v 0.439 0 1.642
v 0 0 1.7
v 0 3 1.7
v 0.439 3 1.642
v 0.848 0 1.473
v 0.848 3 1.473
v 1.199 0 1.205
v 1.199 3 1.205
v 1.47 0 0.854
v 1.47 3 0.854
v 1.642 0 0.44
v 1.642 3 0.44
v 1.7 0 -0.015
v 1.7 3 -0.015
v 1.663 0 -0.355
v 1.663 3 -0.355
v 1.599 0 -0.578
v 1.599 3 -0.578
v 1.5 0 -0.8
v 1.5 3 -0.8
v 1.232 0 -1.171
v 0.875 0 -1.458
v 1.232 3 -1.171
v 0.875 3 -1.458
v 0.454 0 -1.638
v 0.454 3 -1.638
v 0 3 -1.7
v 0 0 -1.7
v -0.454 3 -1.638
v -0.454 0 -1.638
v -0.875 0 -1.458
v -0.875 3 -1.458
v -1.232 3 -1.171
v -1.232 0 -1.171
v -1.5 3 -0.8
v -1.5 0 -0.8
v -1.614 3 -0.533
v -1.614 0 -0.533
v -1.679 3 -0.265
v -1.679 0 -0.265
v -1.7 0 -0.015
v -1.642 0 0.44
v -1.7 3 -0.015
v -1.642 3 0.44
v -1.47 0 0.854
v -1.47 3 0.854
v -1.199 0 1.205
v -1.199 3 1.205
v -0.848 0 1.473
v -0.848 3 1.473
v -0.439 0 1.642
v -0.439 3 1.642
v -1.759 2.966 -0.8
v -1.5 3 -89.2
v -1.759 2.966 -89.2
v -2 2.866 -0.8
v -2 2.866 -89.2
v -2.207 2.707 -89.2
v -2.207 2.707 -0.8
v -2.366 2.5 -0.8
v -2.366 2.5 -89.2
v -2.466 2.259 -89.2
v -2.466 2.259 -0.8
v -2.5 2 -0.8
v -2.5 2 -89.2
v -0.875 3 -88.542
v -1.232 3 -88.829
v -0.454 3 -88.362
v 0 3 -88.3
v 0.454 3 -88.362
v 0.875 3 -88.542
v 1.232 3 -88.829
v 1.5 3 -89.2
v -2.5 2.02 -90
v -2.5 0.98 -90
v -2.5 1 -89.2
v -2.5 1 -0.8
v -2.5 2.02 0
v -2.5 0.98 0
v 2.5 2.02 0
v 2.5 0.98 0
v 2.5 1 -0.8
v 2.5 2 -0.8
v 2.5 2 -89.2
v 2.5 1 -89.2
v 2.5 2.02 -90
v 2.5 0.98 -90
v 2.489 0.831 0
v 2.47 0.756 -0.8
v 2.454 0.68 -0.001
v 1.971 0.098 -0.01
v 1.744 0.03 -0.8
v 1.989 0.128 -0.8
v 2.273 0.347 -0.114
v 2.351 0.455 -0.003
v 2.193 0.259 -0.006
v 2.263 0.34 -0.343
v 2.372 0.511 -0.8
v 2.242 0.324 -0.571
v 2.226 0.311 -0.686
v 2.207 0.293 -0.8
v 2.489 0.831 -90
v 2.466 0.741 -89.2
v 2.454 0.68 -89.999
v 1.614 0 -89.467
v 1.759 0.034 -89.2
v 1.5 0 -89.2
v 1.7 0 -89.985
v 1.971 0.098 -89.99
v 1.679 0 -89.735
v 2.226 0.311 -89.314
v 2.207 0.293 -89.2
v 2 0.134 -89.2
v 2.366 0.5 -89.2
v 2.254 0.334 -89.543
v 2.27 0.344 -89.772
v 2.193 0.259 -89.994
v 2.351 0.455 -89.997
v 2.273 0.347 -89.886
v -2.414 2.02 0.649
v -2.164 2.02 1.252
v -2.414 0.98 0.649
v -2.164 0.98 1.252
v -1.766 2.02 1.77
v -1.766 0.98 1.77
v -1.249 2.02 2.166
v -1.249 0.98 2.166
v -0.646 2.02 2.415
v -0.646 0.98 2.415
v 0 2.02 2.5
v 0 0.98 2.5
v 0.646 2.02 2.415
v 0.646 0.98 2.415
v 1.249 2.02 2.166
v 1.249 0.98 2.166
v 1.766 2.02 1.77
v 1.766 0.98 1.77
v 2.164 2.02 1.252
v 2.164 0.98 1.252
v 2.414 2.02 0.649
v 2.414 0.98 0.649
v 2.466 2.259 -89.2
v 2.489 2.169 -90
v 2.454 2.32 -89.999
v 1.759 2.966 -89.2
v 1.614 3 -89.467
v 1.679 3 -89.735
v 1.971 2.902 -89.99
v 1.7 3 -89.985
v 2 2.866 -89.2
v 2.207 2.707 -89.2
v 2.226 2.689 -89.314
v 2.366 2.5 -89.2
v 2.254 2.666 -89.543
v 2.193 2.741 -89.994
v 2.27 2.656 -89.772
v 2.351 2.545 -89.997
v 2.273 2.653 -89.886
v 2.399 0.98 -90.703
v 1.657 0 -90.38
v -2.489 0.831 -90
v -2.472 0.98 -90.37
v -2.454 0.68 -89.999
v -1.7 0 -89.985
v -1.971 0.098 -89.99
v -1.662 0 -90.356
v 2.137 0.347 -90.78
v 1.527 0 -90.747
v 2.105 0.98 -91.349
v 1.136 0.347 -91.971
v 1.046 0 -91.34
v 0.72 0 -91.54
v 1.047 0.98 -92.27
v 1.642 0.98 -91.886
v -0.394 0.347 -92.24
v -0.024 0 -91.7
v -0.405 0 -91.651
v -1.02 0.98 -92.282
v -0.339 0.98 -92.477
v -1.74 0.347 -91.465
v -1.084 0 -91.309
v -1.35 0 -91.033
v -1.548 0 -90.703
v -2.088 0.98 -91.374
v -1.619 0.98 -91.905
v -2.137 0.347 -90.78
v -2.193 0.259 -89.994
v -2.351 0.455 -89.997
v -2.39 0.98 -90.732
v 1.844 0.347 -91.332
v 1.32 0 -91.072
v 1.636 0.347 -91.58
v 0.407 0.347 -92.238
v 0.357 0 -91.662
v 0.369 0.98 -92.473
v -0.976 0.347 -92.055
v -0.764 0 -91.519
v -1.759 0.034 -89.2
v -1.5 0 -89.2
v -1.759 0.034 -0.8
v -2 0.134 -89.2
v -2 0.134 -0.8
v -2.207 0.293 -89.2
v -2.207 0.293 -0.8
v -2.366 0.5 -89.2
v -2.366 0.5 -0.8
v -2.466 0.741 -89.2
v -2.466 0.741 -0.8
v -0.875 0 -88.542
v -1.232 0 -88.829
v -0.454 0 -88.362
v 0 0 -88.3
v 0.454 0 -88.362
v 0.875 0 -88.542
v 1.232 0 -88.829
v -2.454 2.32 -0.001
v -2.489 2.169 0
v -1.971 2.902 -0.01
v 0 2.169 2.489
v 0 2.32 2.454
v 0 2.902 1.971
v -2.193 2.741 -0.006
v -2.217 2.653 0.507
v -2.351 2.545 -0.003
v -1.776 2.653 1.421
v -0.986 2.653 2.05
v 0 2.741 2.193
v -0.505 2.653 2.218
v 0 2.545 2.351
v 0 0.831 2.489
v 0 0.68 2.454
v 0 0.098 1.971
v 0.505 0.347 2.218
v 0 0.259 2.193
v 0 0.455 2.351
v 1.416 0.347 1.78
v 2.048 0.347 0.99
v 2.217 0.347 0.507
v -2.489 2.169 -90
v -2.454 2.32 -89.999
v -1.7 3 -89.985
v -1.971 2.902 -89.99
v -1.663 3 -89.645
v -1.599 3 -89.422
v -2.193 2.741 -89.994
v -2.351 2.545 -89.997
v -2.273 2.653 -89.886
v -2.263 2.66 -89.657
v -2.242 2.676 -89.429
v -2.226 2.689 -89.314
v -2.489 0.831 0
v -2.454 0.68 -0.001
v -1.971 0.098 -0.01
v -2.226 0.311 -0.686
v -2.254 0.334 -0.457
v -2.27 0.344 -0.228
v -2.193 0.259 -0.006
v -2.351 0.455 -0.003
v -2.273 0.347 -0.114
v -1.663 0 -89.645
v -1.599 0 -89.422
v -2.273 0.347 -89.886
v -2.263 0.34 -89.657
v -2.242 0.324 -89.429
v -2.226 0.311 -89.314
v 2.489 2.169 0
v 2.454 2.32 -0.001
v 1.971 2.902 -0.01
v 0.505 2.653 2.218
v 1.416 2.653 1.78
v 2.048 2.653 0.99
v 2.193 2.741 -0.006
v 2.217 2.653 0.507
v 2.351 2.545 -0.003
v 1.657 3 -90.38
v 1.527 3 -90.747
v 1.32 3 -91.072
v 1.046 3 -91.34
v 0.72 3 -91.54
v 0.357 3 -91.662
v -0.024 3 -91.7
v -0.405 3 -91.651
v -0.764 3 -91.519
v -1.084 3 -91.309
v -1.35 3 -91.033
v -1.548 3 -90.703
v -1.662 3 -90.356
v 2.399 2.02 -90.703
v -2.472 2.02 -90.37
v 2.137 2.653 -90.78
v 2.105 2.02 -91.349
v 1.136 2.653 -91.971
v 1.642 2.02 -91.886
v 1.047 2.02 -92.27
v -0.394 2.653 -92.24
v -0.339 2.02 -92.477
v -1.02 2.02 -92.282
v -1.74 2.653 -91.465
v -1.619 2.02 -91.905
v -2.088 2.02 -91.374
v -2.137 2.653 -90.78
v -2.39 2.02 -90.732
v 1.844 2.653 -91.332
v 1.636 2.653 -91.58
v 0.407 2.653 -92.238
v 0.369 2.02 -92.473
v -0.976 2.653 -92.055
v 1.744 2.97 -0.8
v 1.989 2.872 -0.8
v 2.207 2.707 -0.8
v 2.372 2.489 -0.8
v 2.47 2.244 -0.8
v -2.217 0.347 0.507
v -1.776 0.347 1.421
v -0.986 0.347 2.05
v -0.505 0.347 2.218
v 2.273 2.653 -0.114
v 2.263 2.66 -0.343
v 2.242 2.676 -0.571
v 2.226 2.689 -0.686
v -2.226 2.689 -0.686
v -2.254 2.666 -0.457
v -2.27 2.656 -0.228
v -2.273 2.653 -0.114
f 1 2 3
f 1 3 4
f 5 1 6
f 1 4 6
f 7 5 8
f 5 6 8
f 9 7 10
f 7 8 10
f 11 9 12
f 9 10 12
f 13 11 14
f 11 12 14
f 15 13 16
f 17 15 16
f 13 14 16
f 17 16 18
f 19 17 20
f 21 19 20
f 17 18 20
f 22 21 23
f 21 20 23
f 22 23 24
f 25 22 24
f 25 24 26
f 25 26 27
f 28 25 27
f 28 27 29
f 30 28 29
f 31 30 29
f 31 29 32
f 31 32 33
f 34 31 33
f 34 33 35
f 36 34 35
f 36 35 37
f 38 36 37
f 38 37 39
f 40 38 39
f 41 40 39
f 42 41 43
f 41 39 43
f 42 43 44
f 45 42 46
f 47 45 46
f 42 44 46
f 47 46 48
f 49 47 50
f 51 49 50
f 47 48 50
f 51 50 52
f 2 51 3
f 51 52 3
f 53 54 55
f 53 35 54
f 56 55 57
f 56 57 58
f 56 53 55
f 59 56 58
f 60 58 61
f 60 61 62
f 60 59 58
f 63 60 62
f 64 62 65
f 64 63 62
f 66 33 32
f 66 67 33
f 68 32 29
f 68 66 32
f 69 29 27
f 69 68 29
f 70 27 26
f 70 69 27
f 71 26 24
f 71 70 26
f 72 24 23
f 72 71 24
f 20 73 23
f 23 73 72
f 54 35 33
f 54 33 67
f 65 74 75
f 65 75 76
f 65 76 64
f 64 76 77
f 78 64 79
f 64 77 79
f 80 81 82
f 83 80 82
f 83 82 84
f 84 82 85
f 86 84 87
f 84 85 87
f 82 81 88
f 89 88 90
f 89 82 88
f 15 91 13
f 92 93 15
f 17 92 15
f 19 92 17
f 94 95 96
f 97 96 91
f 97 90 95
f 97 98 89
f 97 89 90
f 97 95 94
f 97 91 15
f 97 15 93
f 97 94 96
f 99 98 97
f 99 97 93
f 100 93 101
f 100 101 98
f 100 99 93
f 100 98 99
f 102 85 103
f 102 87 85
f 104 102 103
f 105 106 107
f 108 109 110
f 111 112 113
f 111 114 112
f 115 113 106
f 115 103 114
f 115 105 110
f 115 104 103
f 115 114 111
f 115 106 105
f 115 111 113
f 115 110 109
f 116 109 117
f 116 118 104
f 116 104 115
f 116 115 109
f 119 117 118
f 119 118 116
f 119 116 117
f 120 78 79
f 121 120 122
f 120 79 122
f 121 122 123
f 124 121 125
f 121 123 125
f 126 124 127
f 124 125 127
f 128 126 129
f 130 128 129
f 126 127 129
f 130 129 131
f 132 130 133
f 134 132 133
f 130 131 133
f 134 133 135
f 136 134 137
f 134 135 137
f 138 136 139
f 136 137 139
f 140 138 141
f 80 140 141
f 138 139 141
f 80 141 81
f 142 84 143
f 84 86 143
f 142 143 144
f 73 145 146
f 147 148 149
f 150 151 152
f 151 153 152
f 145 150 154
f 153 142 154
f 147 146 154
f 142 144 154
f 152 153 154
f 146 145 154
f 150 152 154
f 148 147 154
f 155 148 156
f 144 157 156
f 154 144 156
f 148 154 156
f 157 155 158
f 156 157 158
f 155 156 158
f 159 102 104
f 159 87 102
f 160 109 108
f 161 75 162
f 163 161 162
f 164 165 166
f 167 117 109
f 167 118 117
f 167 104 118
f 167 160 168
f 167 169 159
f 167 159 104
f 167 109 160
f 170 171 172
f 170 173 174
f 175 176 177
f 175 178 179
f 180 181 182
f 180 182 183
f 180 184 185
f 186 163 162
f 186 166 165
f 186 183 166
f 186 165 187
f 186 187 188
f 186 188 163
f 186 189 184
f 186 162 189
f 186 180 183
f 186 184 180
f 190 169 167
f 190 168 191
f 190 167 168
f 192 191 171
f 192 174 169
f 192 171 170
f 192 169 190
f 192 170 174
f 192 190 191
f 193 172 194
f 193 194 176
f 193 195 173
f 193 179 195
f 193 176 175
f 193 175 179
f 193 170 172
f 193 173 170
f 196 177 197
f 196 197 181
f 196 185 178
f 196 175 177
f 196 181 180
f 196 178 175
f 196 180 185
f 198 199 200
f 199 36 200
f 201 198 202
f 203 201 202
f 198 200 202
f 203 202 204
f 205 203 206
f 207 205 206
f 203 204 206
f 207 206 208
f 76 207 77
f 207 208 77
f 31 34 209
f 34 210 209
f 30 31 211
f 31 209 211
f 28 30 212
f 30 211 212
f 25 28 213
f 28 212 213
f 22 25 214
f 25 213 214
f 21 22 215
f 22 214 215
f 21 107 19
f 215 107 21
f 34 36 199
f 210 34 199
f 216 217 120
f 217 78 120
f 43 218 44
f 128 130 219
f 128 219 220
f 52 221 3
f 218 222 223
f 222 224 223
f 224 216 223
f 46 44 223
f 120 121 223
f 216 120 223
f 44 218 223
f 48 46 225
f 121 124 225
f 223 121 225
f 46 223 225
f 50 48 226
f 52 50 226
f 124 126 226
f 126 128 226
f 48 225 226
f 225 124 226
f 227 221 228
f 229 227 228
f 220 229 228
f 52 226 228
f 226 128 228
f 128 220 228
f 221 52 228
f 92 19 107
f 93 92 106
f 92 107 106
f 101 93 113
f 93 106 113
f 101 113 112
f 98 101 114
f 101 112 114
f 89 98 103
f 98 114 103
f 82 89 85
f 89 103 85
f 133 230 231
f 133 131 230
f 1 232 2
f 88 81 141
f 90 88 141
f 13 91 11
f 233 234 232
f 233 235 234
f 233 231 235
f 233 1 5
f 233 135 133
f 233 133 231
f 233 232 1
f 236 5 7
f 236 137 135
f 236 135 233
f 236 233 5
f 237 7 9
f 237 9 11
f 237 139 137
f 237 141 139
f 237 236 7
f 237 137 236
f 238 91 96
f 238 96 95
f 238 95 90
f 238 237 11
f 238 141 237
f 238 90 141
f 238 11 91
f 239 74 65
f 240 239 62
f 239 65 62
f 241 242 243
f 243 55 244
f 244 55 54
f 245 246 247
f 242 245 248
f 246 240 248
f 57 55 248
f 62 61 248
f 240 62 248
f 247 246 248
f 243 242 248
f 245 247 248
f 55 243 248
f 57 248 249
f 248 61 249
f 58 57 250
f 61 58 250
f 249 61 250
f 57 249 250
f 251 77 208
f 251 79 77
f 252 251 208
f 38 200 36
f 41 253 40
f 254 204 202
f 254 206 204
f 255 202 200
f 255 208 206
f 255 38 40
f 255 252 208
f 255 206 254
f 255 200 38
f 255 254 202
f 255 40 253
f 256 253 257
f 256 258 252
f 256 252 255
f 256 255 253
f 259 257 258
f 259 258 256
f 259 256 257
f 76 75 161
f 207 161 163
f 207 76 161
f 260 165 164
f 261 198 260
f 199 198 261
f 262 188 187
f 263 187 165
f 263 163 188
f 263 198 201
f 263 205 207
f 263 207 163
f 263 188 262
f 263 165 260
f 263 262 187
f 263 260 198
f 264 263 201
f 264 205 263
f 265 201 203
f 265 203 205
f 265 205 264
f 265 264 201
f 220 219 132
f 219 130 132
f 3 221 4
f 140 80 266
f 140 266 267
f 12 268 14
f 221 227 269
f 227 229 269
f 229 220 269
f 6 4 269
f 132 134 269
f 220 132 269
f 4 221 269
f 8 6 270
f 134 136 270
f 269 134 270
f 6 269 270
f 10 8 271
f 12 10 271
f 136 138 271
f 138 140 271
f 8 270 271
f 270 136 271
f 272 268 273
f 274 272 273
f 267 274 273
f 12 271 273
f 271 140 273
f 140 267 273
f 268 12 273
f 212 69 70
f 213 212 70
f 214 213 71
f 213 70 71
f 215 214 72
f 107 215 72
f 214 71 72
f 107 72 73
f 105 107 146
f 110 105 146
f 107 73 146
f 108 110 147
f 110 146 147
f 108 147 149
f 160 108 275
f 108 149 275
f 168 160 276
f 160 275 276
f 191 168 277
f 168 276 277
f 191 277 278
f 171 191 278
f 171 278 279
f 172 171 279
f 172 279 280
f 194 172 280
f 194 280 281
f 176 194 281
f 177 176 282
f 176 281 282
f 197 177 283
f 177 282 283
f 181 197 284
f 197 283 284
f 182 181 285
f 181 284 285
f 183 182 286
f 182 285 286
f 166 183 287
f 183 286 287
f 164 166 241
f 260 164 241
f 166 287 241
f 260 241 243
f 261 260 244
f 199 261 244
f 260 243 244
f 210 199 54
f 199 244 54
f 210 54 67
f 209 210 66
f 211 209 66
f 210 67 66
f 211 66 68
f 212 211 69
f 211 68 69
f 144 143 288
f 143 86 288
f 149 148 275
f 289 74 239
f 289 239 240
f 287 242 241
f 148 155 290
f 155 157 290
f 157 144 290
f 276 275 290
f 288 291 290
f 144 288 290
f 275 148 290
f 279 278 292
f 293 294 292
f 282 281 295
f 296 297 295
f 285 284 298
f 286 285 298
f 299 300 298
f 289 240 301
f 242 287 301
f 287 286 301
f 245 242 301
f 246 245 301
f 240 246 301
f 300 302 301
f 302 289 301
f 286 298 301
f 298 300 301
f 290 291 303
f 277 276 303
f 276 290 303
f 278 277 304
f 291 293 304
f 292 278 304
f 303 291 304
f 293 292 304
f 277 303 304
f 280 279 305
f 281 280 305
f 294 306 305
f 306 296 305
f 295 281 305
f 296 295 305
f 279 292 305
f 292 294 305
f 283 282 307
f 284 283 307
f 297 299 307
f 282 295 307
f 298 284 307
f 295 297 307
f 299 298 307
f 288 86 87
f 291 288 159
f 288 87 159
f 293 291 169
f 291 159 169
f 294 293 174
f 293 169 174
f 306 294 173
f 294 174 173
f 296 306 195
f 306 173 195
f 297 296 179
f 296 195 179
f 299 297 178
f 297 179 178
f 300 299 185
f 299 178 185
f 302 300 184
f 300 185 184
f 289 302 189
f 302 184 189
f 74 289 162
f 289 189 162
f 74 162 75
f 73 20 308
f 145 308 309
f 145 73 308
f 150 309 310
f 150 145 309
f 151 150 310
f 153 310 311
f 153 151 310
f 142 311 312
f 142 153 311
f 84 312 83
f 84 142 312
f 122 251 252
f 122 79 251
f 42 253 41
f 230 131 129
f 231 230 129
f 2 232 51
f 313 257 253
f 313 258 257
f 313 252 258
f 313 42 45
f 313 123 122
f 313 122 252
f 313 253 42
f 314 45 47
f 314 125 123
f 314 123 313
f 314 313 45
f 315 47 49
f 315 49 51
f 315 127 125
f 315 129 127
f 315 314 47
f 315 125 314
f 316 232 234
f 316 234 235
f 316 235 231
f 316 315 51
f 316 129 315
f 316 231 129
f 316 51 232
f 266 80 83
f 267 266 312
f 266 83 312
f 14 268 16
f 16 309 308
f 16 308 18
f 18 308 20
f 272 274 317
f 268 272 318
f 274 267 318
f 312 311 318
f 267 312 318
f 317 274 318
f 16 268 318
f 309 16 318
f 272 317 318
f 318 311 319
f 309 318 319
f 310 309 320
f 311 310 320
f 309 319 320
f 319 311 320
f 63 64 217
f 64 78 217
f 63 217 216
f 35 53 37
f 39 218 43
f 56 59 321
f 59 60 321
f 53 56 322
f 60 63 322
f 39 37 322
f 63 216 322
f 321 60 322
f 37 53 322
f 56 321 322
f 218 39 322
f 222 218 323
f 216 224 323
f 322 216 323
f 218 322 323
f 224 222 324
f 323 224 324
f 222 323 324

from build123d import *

# Parameters (mm, degrees)
EXTRUDE_1_DEPTH     = 3
CUT_EXTRUDE_1_REACH = 94.582
SKETCH_2_R          = 1.7
FILLET_1_R          = 1


with BuildPart() as part:
    # 草图1 → 凸台-拉伸1 (new body)
    with BuildSketch(Plane(origin=(0, 0, 0), x_dir=(1, 0, 0), z_dir=(0, 1, 0))):
        with BuildLine():
            Line((2.5, 0), (2.5, 90))
            ThreePointArc((2.5, 90), (0, 92.5), (-2.5, 90))
            Line((-2.5, 90), (-2.5, 0))
            ThreePointArc((-2.5, 0), (0, -2.5), (2.5, 0))
        make_face()
    extrude(amount=EXTRUDE_1_DEPTH)

    # 草图2 → 切除-拉伸1 (cut, up to next)
    with BuildSketch(Plane(origin=(0, 3, 0), x_dir=(1, 0, 0), z_dir=(0, 1, 0)), mode=Mode.PRIVATE) as cut_extrude_1_sk1:
        with Locations(Location((0, 0, 0), (0, 0, 270))):
            Circle(SKETCH_2_R)
    cut_extrude_1_tool1 = extrude(cut_extrude_1_sk1.sketch, amount=-CUT_EXTRUDE_1_REACH, mode=Mode.PRIVATE) & part.part
    # 草图2 → 切除-拉伸1 (cut, up to next)
    with BuildSketch(Plane(origin=(0, 3, 0), x_dir=(1, 0, 0), z_dir=(0, 1, 0)), mode=Mode.PRIVATE) as cut_extrude_1_sk2:
        with Locations(Location((0, 90, 0), (0, 0, 270))):
            Circle(SKETCH_2_R)
    cut_extrude_1_tool2 = extrude(cut_extrude_1_sk2.sketch, amount=-CUT_EXTRUDE_1_REACH, mode=Mode.PRIVATE) & part.part
    add(cut_extrude_1_tool1.solids().sort_by_distance((0, 3, 0))[0], mode=Mode.SUBTRACT)
    add(cut_extrude_1_tool2.solids().sort_by_distance((0, 3, -90))[0], mode=Mode.SUBTRACT)

    # 圆角1
    fillet_1_edges = [part.edges().sort_by_distance(p)[0] for p in [
        (-2.5, 0, -45),
        (-2.5, 3, -45),
        (2.5, 0, -45),
        (2.5, 3, -45),
    ]]
    fillet(fillet_1_edges, radius=FILLET_1_R)


solid = part.part
